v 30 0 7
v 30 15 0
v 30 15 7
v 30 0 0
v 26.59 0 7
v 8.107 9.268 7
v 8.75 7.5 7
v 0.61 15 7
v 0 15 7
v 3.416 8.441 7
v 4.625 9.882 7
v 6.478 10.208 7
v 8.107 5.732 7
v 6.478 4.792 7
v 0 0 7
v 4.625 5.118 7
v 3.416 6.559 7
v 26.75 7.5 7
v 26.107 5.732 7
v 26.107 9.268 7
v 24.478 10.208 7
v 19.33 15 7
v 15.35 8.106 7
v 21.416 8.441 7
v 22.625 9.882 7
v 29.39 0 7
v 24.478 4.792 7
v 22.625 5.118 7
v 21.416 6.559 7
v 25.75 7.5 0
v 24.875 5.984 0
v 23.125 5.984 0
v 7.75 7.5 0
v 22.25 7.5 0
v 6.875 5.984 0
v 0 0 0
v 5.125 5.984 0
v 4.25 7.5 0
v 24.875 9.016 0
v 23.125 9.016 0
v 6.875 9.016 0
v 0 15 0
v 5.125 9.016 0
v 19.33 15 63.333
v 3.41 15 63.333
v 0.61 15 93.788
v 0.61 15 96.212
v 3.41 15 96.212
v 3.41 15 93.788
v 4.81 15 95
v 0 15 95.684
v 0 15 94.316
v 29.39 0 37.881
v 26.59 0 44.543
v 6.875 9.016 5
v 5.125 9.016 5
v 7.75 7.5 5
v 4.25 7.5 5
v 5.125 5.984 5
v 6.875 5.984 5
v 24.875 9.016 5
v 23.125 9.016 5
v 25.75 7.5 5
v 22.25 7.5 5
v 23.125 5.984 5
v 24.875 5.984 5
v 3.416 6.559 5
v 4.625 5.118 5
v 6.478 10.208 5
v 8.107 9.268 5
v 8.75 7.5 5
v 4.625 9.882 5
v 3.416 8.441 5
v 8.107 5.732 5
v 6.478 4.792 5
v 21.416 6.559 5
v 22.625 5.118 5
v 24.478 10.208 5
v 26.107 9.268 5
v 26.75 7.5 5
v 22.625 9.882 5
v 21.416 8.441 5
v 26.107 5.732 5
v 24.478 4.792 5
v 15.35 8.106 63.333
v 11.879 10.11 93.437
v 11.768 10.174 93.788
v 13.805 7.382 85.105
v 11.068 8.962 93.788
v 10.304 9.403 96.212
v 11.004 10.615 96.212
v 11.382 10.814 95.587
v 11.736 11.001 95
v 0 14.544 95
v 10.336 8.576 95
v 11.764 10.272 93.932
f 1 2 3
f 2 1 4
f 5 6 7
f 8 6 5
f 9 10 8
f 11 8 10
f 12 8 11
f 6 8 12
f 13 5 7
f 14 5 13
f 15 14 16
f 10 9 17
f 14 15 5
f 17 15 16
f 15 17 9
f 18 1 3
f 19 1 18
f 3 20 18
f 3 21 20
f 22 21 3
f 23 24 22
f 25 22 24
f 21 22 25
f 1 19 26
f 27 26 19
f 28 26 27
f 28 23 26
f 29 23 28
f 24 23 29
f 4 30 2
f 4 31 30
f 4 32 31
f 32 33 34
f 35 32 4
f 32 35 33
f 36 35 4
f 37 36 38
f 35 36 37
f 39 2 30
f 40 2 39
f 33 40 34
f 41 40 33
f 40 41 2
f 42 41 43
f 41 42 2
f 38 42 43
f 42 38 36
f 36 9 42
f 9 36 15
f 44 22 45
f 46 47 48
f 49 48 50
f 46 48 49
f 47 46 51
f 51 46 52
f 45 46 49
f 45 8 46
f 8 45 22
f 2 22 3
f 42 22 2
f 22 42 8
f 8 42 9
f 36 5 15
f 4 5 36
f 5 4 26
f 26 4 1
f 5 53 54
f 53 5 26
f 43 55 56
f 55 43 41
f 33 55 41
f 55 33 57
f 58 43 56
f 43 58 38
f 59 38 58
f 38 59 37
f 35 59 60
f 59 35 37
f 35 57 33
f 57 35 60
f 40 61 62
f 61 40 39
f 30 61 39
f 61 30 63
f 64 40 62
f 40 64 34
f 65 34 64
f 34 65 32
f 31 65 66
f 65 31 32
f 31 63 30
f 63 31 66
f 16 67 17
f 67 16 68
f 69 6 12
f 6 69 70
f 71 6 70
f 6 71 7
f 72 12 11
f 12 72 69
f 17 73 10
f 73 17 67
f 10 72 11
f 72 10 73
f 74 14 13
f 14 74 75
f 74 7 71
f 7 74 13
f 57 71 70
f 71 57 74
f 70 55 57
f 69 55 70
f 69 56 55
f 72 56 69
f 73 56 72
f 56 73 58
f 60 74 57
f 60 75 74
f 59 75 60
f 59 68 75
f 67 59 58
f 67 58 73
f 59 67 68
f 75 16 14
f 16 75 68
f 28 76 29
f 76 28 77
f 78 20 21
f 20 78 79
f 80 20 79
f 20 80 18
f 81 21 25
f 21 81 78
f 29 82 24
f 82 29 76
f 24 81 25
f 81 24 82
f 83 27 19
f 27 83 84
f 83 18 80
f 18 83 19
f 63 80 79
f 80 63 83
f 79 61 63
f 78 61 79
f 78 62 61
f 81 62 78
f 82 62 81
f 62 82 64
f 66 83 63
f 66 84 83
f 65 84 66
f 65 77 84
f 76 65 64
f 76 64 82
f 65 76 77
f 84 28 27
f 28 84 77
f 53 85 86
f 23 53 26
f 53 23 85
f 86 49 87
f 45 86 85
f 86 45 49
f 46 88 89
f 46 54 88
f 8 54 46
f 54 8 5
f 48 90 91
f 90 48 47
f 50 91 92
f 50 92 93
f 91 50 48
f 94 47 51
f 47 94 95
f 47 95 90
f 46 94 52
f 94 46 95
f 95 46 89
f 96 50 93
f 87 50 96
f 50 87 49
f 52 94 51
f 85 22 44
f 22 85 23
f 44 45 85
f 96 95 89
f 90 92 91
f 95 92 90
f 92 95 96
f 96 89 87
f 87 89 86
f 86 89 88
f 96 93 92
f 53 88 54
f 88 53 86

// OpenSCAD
OB=15;
sw=3;
w=1.4;
HH=95;
difference(){
    cube([2*OB,OB,7]);
    translate([2*OB/5,OB/2,-1]) cylinder(d=3.5,h=7+2);
    translate([8*OB/5,OB/2,-1]) cylinder(d=3.5,h=7+2);
    translate([2*OB/5,OB/2,5]) cylinder(d=5.5,h=7+2);
    translate([8*OB/5,OB/2,5]) cylinder(d=5.5,h=7+2);
}

difference() {
 union(){
   intersection(){
    translate([OB,OB/2,HH/2]) rotate([0,0,60])
    {
            cube([w,OB*4,HH], center=true);
            translate([0,OB*2,HH/2]) rotate([90,0,0]) cylinder(d=w*2,h=OB*2,$fn=6);
    }
        cube([2*OB,OB,HH*2]);
    }
intersection(){
    translate([OB,OB/2,HH/2]) rotate([0,0,60-90])translate([-OB/2,OB,0]) cube([OB,OB*2,HH], center=true);
    cube([2*OB,OB,2*HH/3]);
}

}
           translate([OB,OB/2,HH/2]) rotate([0,0,180+60])
                translate([-OB,2*OB,-2*HH/4 ])
             rotate([20,0,0]) cube([2*OB,OB*4,HH*2]);
}
%rotate([0,0,-30]) translate([0,50,0]) cylinder(r=100,h=7, $fn=3);
